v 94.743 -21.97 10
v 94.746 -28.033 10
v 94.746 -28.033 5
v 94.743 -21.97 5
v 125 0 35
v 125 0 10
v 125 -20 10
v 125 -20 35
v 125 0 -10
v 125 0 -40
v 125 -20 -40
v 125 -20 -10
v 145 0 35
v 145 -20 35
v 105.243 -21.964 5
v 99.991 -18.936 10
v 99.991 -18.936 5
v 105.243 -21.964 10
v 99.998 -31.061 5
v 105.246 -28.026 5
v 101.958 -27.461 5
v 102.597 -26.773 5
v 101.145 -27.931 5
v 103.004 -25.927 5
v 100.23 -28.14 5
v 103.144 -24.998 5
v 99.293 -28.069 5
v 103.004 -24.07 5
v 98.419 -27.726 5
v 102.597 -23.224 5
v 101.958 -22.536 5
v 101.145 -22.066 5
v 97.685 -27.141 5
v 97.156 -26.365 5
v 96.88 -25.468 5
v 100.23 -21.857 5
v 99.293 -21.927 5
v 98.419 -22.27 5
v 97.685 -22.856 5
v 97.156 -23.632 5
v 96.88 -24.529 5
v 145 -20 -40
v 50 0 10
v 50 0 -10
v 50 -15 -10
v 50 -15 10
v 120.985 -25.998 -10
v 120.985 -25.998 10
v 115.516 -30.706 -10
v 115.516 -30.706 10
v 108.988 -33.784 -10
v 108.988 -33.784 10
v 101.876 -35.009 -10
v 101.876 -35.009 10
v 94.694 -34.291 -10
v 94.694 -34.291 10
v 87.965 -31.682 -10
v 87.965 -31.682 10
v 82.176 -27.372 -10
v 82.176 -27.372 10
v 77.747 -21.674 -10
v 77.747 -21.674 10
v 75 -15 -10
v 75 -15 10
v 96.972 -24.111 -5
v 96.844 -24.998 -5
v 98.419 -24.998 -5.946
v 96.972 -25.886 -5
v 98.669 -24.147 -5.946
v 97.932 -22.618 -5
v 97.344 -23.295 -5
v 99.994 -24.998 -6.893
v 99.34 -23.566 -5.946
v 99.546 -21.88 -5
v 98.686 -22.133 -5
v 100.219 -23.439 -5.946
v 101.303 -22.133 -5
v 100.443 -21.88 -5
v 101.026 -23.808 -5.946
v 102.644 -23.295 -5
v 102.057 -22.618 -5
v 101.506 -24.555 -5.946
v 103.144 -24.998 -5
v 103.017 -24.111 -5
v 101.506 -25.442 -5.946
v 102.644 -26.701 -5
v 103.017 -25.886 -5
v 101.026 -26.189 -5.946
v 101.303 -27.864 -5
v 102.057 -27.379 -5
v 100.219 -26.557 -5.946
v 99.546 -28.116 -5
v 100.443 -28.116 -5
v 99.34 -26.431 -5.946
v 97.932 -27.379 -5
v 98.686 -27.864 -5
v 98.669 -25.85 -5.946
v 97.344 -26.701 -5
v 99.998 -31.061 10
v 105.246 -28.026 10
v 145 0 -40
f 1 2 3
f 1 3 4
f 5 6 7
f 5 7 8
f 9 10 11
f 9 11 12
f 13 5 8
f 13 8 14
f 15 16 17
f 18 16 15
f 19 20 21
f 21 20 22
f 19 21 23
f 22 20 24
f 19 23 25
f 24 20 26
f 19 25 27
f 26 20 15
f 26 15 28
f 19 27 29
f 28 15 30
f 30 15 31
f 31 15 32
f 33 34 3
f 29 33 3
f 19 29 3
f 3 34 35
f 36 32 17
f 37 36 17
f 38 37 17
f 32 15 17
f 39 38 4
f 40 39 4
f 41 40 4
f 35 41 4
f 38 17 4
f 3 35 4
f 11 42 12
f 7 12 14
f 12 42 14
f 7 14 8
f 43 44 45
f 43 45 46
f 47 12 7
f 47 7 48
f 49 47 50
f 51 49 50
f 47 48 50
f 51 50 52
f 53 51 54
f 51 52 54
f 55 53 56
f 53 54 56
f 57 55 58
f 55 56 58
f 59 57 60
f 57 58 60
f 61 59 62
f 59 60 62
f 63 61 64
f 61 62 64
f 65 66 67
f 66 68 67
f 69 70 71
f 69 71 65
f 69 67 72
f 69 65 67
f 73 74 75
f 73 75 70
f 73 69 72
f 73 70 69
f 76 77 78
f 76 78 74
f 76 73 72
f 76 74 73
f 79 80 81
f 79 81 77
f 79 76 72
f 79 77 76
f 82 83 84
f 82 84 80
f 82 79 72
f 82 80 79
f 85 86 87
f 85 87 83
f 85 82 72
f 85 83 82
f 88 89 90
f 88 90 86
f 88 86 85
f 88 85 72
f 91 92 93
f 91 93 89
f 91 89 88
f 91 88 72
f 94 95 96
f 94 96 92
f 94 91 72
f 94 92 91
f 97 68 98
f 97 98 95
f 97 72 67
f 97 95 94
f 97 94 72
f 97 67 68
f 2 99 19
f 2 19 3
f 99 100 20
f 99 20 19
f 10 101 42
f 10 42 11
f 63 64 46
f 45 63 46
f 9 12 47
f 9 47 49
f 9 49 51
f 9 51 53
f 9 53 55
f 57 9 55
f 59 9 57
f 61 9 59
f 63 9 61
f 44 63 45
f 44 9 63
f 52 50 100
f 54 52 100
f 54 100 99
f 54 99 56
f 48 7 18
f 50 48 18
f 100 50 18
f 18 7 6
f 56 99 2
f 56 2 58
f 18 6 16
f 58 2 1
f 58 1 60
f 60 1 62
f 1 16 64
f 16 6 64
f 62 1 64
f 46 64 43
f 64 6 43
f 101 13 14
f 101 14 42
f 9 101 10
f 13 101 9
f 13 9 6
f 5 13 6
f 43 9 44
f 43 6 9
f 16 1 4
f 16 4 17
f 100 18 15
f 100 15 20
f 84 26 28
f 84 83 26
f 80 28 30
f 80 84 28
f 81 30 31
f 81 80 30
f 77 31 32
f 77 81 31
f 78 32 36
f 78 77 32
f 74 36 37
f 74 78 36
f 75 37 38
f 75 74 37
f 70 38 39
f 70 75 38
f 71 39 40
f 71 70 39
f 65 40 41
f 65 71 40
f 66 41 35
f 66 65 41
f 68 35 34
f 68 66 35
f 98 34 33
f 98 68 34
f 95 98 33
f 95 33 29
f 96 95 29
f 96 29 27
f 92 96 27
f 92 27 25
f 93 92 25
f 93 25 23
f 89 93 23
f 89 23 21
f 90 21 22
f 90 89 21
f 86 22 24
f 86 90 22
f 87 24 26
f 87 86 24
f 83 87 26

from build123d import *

# Parameters (mm, degrees)
F1_DEPTH = 20
F0_W     = 75
F0_H     = 20
F2_DEPTH = 15
F4_DEPTH = 10
F6_DEPTH = 5
F7_D     = 6.3
F7_DEPTH = 15
F7_TIP   = 1.8927109499


with BuildPart() as f1:
    # F0 (on Front) → F1 (new body)
    with BuildSketch(Plane.XZ):
        Polygon((-25, 35), (-45, 35), (-45, -40), (-25, -40), (-25, -10), (-25, 10), align=None)
    extrude(amount=F1_DEPTH)

    # F0 (on Front) → F2 (join)
    with BuildSketch(Plane.XZ):
        with Locations((12.5, 0)):
            Rectangle(F0_W, F0_H)
    extrude(amount=F2_DEPTH)

    # F3 (on Top) → F4 (join, symmetric)
    with BuildSketch(Plane.XY):
        with BuildLine():
            Line((-25, -15), (-25, -20))
            ThreePointArc((-25, -20), (1.7392618935, -34.8926189355), (25, -15))
            Line((25, -15), (0, -15))
            Line((0, -15), (-25, -15))
        make_face()
    extrude(amount=F4_DEPTH, both=True)

    # F5 (on face) → F6 (cut)
    with BuildSketch(Plane.XY.offset(10)):
        Polygon((5.2573132542, -21.9703298494), (0.009059209, -18.9362188631), (-5.2426850057, -21.9642846986), (-5.2461751751, -28.0264615203), (0.0020788701, -31.0605725067), (5.2538230847, -28.0325066712), align=None)
    extrude(amount=-F6_DEPTH, mode=Mode.SUBTRACT)

    # F7
    with Locations(Plane.XY.offset(10)):
        with Locations((0.0055690395, -24.9983956849)):
            Hole(F7_D / 2, depth=F7_DEPTH)
            with Locations((0, 0, -(F7_DEPTH + F7_TIP / 2))):  # 118° drill point
                Cone(0, F7_D / 2, F7_TIP, mode=Mode.SUBTRACT)


with BuildPart() as f8_1:
    # F8: instance of F1
    add(f1.part.mirror(Plane(origin=(50, -7.5, 0), x_dir=(0, 1, 0), z_dir=(1, 0, 0))))


solid = f8_1.part
